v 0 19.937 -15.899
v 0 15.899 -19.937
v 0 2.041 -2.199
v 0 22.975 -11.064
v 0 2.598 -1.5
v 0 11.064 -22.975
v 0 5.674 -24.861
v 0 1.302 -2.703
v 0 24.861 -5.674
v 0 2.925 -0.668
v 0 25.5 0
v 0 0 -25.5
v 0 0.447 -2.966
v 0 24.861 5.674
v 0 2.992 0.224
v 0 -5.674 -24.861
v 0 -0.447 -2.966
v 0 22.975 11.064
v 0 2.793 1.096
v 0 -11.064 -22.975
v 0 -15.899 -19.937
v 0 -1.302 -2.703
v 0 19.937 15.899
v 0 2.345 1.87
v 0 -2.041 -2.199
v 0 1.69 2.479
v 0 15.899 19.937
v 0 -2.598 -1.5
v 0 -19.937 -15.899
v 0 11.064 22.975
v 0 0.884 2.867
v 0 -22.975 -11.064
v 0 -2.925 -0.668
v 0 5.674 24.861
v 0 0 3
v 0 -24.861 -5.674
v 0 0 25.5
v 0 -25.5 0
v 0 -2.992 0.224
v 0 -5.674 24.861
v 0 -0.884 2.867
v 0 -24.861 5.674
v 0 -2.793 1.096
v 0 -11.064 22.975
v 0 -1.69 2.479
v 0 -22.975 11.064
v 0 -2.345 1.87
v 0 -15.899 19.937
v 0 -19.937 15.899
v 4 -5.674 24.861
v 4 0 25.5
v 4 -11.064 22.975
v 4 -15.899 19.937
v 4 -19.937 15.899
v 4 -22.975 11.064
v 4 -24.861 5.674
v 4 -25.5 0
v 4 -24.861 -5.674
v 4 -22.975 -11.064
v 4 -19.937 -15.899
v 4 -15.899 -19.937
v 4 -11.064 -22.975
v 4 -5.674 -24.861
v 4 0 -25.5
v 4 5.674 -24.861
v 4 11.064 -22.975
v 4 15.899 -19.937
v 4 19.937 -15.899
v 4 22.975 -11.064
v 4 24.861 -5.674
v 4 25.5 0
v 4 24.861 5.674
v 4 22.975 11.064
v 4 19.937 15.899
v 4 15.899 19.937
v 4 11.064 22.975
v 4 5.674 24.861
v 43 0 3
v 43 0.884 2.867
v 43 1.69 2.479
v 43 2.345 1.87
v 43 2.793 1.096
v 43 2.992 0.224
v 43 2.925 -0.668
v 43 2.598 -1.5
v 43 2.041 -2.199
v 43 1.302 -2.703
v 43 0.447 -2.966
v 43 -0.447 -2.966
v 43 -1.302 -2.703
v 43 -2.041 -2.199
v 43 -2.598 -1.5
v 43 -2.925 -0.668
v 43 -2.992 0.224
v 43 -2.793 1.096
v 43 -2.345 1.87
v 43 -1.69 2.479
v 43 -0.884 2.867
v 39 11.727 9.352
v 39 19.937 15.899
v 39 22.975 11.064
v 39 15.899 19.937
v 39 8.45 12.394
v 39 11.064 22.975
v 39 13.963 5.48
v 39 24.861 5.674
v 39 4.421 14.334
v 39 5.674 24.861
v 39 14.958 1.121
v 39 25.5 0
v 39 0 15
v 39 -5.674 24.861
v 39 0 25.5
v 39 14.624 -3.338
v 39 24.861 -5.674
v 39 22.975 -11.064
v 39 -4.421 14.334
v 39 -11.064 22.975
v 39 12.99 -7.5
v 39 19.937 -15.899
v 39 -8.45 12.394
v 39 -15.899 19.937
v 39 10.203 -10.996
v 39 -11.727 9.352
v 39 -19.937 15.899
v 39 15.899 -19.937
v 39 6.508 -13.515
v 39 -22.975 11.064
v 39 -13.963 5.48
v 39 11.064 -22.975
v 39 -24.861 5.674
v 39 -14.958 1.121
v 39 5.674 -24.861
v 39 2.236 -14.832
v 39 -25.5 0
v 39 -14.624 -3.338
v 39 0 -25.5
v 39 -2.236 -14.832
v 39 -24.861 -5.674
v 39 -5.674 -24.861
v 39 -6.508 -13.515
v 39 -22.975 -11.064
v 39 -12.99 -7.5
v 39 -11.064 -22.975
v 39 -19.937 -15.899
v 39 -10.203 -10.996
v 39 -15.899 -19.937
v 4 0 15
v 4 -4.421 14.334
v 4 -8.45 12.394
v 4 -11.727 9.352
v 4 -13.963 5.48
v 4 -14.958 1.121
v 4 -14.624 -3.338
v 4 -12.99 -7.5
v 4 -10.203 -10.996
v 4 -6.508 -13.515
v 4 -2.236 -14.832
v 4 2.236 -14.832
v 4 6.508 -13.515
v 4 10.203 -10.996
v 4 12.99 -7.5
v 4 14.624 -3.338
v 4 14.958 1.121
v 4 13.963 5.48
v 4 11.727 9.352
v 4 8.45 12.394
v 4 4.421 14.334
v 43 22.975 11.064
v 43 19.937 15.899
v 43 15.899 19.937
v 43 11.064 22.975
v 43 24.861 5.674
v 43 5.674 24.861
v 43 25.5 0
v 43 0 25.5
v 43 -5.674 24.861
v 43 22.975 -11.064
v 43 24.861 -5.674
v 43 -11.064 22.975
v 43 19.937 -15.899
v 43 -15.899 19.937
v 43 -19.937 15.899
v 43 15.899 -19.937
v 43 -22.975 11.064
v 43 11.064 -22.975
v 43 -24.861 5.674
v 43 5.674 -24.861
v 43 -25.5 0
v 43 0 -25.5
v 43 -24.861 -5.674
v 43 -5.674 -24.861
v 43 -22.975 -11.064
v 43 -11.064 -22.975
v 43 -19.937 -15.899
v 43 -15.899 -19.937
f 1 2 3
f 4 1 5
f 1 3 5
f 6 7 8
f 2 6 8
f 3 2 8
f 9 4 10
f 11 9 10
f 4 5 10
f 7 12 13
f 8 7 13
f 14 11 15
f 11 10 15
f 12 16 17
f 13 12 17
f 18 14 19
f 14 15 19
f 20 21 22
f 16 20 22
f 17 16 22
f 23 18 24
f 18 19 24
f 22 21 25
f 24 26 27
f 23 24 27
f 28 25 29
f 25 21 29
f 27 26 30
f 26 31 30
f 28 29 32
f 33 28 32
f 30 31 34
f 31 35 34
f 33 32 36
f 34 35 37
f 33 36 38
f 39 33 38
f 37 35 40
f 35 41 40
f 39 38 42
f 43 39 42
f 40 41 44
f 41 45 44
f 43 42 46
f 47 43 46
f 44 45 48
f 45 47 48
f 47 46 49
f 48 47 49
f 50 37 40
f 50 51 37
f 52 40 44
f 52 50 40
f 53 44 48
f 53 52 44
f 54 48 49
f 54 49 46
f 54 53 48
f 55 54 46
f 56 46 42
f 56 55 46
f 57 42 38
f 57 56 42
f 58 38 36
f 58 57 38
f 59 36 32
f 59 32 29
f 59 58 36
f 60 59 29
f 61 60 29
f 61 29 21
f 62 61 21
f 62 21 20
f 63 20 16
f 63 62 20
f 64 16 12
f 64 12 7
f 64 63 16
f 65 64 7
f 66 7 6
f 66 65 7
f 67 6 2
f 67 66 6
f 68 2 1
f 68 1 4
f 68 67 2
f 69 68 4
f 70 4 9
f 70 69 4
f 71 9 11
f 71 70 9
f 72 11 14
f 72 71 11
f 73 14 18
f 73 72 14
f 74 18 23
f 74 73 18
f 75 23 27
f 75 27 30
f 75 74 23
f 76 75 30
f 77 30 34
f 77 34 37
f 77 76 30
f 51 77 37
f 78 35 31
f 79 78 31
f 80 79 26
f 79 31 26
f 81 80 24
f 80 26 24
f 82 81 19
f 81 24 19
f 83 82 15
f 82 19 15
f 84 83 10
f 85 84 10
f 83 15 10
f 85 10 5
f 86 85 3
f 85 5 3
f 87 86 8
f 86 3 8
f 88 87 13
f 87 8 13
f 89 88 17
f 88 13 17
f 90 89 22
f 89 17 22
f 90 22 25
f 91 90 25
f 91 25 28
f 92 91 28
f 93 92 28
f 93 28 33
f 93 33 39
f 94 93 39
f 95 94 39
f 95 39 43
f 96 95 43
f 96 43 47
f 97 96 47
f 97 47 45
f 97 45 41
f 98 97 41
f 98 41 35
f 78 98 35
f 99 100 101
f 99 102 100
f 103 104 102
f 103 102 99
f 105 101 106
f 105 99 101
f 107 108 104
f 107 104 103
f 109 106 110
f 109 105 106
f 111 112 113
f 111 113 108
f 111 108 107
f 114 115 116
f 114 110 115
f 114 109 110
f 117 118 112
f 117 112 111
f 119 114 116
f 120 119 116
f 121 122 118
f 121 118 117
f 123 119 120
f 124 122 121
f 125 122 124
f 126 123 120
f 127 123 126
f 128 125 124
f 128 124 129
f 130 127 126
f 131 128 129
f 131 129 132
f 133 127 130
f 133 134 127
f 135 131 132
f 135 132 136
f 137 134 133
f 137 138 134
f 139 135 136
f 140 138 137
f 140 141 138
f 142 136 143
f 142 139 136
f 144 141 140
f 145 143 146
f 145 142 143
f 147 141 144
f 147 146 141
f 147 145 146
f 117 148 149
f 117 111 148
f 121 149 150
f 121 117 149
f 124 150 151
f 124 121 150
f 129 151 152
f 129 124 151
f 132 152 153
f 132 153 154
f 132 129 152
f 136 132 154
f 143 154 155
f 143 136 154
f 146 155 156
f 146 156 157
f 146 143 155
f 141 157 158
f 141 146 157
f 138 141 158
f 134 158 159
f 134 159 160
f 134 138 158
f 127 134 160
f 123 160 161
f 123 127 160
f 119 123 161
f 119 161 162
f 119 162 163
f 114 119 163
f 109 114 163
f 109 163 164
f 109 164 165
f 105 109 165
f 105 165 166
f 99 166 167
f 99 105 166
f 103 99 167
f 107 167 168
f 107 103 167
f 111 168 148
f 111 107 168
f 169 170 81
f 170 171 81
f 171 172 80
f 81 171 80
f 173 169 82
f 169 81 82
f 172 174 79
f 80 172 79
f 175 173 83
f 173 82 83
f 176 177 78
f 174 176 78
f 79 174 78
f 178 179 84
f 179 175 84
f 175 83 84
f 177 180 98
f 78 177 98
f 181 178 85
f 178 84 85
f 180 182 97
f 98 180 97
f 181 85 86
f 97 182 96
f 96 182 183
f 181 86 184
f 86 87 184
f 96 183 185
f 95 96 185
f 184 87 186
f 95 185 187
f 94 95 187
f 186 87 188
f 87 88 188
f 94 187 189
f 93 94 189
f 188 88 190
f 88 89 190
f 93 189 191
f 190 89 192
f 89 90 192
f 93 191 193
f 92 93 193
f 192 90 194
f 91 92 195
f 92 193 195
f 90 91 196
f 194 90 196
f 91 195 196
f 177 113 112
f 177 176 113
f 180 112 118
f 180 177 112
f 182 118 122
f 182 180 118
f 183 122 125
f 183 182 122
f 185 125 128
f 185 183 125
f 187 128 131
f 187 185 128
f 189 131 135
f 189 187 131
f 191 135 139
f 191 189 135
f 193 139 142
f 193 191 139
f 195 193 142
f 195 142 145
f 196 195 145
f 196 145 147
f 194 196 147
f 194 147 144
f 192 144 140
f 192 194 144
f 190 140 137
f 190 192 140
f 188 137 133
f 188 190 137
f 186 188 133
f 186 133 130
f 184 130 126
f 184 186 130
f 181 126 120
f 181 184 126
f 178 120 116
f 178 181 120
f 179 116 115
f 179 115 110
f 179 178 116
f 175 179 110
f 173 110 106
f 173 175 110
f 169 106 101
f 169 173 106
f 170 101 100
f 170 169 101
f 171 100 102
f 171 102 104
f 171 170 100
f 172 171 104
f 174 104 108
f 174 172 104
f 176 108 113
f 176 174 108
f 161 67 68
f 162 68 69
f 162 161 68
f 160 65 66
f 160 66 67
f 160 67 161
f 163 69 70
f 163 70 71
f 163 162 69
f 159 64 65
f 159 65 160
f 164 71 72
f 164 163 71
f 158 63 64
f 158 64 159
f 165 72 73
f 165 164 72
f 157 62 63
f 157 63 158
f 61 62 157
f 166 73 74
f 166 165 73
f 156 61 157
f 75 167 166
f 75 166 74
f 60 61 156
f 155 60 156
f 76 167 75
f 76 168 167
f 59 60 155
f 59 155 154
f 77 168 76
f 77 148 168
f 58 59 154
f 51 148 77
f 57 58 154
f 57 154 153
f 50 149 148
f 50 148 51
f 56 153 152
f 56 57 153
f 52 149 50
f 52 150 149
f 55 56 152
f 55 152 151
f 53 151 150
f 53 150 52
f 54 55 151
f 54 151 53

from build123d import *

# Parameters (mm, degrees)
SKETCH8_R          = 3
CUT_EXTRUDE1_DEPTH = 57.120406271


with BuildPart() as part:
    # Sketch1 → Revolve1 (revolve)
    with BuildSketch(Plane.XY, mode=Mode.PRIVATE) as revolve1_sk:
        Polygon((0, 0), (0, 3), (0, 25.5), (4, 25.5), (4, 15), (39, 15), (39, 25.5), (43, 25.5), (43, 3), (43, 0), align=None)
    revolve(revolve1_sk.sketch.rotate(Axis((0, 0, 0), (1, 0, 0)), 90), axis=Axis((0, 0, 0), (1, 0, 0)))

    # Sketch8 → Cut-Extrude1 (cut, through all)
    with BuildSketch(Plane.ZY):
        Circle(SKETCH8_R)
    extrude(amount=-CUT_EXTRUDE1_DEPTH, mode=Mode.SUBTRACT)


solid = part.part
